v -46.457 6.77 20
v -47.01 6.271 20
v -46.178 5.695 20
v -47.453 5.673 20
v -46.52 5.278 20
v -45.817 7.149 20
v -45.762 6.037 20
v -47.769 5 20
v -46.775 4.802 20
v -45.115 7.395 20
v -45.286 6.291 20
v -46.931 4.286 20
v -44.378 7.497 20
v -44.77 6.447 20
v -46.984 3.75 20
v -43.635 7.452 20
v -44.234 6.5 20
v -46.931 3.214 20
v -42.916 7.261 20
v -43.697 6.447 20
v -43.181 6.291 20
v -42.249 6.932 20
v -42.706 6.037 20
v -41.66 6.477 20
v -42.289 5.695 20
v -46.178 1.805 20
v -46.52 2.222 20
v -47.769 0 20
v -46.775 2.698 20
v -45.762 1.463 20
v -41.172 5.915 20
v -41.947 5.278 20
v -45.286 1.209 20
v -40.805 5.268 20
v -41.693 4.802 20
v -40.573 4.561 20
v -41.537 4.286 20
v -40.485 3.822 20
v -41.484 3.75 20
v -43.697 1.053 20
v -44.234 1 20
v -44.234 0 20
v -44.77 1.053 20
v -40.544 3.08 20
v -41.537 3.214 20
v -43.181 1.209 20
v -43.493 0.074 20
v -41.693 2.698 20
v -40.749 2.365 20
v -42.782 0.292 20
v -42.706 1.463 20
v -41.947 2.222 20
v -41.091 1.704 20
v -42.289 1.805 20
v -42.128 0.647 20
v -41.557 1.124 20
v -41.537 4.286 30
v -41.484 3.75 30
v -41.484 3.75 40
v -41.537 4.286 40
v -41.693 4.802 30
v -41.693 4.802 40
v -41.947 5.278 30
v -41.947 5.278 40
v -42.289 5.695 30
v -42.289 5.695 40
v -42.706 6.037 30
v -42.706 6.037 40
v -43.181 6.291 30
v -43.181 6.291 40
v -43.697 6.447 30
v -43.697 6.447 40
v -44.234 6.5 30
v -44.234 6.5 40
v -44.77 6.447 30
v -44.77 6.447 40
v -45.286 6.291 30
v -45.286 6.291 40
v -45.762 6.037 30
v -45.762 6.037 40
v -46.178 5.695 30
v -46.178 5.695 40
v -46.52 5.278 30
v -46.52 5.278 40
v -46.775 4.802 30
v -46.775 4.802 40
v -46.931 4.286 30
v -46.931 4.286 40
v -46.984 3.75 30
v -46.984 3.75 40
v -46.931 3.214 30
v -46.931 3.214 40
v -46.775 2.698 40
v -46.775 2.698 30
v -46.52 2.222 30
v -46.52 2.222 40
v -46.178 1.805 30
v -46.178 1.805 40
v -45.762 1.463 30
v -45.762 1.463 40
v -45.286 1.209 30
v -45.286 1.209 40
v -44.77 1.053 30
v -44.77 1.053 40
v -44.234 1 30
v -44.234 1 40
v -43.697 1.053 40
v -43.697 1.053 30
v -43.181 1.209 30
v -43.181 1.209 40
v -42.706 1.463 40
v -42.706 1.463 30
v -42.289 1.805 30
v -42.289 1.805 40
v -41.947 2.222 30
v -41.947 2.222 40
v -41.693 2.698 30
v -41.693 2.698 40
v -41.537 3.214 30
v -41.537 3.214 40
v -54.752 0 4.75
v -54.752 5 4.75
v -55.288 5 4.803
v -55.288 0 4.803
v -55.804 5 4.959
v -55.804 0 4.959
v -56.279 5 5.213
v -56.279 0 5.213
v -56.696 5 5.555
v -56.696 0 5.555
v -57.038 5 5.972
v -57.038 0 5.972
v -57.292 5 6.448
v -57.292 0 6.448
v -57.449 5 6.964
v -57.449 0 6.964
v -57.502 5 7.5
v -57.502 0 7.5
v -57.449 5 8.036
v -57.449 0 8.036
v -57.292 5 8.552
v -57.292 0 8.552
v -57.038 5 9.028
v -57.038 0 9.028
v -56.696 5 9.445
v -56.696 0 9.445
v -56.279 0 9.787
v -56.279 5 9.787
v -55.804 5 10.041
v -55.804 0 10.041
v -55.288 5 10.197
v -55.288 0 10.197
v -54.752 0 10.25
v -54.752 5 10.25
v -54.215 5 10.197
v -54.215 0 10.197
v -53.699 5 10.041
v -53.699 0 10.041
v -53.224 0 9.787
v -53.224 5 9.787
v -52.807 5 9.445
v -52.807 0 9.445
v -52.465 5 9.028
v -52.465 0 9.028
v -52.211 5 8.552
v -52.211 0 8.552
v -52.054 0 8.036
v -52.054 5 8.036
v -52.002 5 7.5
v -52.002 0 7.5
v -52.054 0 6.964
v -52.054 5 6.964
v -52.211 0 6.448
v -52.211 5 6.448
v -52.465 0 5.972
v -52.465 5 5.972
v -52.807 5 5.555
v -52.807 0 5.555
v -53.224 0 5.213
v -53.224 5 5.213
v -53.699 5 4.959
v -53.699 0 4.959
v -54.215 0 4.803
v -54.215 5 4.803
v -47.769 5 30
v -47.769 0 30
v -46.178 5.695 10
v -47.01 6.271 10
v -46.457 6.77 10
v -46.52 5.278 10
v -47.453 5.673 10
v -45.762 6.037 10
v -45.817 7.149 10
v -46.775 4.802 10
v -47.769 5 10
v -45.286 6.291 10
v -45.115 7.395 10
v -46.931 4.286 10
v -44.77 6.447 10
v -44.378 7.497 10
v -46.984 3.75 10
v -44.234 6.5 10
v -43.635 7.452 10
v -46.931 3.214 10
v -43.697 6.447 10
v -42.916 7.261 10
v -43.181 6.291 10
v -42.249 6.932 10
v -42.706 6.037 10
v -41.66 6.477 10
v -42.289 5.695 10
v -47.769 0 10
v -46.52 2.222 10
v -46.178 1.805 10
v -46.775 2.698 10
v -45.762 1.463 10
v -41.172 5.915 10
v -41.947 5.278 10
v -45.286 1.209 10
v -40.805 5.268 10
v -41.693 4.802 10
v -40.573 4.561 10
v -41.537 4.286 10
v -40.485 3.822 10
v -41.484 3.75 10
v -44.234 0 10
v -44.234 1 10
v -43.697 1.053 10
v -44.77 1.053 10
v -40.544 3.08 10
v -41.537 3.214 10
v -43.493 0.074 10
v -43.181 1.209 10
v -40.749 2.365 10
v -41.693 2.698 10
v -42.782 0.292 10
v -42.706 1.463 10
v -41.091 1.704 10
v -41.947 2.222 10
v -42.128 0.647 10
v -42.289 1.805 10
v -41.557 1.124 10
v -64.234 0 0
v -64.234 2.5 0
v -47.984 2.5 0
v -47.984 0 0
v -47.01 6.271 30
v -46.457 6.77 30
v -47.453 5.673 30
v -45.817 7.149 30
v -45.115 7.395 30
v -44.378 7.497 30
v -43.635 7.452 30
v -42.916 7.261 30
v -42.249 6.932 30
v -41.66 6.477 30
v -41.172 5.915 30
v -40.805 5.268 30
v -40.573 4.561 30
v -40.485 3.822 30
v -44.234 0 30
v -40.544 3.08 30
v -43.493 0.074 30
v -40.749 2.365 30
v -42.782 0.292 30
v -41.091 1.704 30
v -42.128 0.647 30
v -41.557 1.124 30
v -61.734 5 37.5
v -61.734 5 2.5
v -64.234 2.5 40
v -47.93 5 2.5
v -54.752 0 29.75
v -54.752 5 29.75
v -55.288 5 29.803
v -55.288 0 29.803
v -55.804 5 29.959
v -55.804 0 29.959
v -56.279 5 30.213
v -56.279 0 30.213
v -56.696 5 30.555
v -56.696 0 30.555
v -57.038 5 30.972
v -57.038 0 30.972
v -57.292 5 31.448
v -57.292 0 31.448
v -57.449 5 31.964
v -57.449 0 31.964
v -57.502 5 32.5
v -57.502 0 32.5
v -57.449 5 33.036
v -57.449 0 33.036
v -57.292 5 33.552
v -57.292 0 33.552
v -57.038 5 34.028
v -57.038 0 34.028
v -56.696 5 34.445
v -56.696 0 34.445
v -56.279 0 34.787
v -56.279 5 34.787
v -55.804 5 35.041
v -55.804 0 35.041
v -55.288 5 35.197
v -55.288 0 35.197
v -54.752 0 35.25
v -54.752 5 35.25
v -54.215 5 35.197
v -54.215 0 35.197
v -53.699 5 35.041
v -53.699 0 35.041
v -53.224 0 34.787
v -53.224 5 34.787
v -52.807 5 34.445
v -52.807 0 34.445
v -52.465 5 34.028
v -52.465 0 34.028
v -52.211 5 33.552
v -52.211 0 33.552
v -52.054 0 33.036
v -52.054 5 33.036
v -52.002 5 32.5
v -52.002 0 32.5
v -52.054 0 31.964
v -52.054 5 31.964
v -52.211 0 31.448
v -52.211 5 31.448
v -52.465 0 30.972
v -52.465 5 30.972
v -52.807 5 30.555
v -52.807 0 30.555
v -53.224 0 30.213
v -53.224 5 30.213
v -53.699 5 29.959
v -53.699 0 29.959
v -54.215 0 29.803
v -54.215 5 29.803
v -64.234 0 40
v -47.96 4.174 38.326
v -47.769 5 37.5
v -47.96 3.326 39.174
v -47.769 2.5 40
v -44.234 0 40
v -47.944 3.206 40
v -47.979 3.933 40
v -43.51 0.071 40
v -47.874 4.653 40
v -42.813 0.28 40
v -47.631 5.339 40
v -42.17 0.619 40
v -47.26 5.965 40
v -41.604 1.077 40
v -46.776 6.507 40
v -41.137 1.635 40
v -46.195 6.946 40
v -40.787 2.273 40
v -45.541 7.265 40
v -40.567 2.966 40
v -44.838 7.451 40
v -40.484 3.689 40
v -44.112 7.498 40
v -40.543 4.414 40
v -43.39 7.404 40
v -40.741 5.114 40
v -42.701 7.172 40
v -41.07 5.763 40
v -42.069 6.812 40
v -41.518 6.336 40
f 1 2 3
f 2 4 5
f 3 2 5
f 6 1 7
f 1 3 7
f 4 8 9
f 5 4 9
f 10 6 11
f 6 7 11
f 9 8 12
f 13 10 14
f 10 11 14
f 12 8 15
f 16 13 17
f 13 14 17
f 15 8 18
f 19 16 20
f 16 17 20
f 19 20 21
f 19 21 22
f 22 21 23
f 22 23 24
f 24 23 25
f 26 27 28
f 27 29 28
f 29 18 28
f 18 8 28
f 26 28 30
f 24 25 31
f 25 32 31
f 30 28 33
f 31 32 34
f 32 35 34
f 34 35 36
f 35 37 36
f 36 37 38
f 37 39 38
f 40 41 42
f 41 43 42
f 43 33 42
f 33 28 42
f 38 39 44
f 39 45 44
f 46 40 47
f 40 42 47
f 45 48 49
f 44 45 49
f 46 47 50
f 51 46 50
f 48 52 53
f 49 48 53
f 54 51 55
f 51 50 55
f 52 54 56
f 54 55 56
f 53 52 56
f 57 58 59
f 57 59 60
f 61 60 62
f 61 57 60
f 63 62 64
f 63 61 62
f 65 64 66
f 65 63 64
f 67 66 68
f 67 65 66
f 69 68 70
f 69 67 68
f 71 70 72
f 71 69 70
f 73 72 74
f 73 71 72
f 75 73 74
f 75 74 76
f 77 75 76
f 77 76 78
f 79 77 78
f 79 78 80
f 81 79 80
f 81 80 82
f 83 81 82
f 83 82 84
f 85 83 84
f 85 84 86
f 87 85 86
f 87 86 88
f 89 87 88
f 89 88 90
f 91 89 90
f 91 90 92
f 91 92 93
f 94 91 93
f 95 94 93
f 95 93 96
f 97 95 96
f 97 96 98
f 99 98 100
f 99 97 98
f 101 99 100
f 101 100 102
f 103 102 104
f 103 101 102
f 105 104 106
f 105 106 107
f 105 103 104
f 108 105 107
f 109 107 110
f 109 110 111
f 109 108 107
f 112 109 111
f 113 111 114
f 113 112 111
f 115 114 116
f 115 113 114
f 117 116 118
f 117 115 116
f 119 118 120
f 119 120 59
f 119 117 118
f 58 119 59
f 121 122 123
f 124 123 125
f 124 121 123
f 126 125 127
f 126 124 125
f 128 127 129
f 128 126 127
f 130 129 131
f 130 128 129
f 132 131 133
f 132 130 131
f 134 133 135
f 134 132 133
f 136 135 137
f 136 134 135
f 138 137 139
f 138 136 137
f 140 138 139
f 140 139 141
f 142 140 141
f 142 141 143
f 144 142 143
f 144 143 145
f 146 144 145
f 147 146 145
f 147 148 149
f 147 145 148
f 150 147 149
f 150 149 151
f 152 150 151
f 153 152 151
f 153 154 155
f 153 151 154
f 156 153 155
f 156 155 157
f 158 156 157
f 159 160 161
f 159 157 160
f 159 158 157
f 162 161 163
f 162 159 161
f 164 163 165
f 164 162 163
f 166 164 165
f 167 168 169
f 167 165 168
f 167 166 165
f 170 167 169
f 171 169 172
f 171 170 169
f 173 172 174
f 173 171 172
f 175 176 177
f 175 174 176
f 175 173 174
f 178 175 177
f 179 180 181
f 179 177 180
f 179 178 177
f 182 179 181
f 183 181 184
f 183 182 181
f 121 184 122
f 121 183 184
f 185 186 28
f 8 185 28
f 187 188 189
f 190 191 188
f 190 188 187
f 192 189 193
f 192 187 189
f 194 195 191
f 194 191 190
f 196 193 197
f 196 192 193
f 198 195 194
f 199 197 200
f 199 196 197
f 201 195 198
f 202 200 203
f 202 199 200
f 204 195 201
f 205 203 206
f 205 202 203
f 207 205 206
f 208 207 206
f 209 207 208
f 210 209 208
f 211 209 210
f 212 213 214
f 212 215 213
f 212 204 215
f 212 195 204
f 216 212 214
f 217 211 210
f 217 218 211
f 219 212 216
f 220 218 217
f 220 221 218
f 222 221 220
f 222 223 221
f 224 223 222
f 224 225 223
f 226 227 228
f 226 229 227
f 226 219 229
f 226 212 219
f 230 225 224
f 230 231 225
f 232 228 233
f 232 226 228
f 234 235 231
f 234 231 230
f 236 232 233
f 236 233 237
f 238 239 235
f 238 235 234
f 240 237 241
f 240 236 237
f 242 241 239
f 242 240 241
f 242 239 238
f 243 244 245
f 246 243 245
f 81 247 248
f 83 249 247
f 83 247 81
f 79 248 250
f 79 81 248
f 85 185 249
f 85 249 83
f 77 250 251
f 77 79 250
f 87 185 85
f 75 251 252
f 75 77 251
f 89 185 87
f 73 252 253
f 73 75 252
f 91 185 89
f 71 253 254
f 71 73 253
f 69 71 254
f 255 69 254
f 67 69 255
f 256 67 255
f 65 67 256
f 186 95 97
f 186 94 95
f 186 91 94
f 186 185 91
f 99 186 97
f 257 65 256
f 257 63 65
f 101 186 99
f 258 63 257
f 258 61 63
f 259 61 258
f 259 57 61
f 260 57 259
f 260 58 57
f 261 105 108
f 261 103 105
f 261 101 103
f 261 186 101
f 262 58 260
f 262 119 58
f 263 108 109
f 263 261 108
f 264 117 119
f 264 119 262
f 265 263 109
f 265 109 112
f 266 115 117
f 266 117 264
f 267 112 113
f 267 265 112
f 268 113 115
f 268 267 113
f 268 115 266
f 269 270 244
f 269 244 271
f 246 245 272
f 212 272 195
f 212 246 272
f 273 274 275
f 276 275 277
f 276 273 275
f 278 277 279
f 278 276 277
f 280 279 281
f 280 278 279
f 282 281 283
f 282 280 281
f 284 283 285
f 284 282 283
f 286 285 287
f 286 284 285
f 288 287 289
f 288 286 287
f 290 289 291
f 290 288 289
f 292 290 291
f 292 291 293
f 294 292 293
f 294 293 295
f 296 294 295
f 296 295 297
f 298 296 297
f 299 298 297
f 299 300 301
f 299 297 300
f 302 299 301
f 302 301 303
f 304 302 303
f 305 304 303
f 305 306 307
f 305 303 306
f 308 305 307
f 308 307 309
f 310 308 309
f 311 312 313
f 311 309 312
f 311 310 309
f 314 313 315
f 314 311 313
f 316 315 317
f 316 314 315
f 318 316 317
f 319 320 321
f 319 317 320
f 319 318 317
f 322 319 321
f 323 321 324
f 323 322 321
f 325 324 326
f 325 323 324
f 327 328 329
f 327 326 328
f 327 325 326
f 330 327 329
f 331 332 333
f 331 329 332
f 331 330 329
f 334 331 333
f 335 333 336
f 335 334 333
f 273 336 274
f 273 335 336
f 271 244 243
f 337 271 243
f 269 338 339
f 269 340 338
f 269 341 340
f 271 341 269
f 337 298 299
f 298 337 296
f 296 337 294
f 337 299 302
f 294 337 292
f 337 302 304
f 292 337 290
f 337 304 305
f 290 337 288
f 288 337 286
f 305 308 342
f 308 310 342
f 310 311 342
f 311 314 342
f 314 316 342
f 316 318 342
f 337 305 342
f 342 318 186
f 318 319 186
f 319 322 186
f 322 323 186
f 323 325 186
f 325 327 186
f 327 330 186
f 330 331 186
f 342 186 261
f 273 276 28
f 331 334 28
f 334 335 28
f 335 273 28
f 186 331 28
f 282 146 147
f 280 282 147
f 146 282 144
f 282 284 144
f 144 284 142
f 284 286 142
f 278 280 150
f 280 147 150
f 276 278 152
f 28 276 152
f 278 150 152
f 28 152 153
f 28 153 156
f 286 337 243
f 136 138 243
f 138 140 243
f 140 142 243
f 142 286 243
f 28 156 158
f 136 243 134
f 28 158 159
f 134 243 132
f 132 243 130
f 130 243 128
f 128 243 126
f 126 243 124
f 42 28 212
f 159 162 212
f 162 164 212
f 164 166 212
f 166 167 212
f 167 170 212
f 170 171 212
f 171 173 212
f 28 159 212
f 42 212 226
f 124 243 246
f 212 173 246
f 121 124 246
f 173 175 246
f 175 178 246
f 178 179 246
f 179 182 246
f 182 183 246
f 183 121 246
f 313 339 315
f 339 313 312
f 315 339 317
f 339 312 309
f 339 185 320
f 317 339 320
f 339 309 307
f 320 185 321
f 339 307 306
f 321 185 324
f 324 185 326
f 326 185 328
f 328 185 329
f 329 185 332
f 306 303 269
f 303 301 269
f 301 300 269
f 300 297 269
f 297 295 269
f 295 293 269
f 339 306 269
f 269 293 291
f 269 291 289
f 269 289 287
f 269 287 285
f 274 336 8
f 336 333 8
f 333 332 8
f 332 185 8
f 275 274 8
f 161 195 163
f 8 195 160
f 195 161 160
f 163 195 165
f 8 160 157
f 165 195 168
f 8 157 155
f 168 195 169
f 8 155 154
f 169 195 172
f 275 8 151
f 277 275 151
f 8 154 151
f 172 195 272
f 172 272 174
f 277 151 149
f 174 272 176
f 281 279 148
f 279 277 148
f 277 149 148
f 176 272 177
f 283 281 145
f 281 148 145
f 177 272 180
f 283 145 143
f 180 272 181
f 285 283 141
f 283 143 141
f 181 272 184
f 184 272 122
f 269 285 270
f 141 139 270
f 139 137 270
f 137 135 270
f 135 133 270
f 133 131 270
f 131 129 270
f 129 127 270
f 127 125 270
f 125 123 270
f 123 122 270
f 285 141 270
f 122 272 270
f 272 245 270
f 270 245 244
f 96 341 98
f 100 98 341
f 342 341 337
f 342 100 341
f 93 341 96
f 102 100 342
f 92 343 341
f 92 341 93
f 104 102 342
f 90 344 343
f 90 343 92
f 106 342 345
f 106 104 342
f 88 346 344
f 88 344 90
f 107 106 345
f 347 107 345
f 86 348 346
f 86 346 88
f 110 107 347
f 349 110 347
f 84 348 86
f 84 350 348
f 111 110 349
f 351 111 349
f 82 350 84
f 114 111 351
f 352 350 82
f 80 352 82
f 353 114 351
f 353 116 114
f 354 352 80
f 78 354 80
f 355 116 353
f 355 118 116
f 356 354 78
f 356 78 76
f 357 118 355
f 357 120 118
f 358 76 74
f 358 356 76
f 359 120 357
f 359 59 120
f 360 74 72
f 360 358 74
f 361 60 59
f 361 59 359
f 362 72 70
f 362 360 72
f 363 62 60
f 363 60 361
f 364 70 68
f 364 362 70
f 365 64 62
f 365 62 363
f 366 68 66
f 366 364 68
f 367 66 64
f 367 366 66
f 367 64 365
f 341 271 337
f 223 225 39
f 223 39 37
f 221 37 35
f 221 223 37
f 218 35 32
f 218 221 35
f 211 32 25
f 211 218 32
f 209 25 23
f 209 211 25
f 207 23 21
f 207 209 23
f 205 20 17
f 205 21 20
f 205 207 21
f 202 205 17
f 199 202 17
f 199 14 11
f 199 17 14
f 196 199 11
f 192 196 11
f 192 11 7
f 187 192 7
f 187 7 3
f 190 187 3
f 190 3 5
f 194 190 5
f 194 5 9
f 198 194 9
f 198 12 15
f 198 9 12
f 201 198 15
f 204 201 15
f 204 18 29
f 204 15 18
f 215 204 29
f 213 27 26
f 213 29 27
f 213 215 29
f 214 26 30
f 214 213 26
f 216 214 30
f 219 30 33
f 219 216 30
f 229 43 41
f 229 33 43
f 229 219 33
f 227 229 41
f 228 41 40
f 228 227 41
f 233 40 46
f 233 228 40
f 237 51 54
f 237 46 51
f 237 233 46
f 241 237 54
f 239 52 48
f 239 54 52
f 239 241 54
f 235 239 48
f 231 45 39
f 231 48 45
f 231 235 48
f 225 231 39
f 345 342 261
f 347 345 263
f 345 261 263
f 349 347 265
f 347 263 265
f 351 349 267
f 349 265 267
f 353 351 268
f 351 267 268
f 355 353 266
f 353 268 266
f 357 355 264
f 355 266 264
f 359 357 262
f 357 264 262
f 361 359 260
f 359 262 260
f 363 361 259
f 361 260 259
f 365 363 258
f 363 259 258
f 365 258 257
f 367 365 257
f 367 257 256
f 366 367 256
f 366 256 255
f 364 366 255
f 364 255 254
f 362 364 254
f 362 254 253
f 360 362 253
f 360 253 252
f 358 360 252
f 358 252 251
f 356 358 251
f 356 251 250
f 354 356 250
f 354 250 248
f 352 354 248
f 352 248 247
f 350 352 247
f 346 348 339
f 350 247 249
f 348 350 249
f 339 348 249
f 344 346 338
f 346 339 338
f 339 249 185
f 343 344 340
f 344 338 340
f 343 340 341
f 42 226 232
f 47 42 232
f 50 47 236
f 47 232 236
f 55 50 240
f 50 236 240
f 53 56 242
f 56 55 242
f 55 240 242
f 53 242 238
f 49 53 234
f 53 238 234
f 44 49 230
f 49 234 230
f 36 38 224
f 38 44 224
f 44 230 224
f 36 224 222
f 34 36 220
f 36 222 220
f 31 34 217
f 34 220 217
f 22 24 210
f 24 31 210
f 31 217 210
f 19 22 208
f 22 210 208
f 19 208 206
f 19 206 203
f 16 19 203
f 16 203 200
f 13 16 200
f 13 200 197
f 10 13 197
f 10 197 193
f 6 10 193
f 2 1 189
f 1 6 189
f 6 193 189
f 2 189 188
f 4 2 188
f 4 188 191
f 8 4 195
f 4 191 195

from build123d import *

# Parameters (mm, degrees)
IZIM1_R                     = 2.75
Y_KSEKLIK_EKSTR_ZYON1_DEPTH = 40
PAH3_SIZE                   = 2.5
IZIM2_R                     = 2.75
IZIM2_W                     = 7.285533906
IZIM2_H                     = 10
KES_EKSTR_ZYON1_DEPTH       = 40
KES_EKSTR_ZYON2_DEPTH       = 88


with BuildPart() as part:
    # Çizim1 → Yükseklik-Ekstrüzyon1 (new body)
    with BuildSketch(Plane.XY):
        with BuildLine():
            Line((-64.233873571, 5), (-64.233873571, 0))
            Line((-64.233873571, 0), (-44.233873571, 0))
            ThreePointArc((-44.233873571, 0), (-41.172011393, 5.915063509), (-47.769407477, 5))
            Line((-47.769407477, 5), (-64.233873571, 5))
        make_face()
        with Locations((-44.233873571, 3.75)):
            Circle(IZIM1_R, mode=Mode.SUBTRACT)
    extrude(amount=Y_KSEKLIK_EKSTR_ZYON1_DEPTH)

    # Pah3
    pah3_edges = [part.edges().sort_by_distance(p)[0] for p in [
        (-56.001640524, 5, 40),
        (-56.001640524, 5, 0),
        (-64.233873571, 5, 20),
    ]]
    chamfer(pah3_edges, length=PAH3_SIZE)

    # Çizim2 → Kes-Ekstrüzyon1 (cut)
    with BuildSketch(Plane(origin=(0, 0, 0), x_dir=(1, 0, 0), z_dir=(0, 1, 0))):
        with Locations(Location((-54.751640524, -32.5, 0), (0, 0, 90))):
            Circle(IZIM2_R)
        with Locations(Location((-54.751640524, -7.5, 0), (0, 0, 90))):
            Circle(IZIM2_R)
        with Locations((-44.126640524, -25)):
            Rectangle(IZIM2_W, IZIM2_H)
        Polygon((-40.483873571, 0), (-47.983873571, 0), (-47.769407477, -10), (-40.483873571, -10), align=None)
    extrude(amount=KES_EKSTR_ZYON1_DEPTH, mode=Mode.SUBTRACT)

    # Çizim3 → Kes-Ekstrüzyon2 (cut)
    with BuildSketch(Plane(origin=(0, 0, 0), x_dir=(0, 0, -1), z_dir=(1, 0, 0))):
        Polygon((-0.875256962, 3.375256962), (-1.784369295, 4.284369295), (0.59171966, 4.284369295), (0.36885853, 3.16350742), align=None)
    extrude(amount=-KES_EKSTR_ZYON2_DEPTH, mode=Mode.SUBTRACT)


solid = part.part
